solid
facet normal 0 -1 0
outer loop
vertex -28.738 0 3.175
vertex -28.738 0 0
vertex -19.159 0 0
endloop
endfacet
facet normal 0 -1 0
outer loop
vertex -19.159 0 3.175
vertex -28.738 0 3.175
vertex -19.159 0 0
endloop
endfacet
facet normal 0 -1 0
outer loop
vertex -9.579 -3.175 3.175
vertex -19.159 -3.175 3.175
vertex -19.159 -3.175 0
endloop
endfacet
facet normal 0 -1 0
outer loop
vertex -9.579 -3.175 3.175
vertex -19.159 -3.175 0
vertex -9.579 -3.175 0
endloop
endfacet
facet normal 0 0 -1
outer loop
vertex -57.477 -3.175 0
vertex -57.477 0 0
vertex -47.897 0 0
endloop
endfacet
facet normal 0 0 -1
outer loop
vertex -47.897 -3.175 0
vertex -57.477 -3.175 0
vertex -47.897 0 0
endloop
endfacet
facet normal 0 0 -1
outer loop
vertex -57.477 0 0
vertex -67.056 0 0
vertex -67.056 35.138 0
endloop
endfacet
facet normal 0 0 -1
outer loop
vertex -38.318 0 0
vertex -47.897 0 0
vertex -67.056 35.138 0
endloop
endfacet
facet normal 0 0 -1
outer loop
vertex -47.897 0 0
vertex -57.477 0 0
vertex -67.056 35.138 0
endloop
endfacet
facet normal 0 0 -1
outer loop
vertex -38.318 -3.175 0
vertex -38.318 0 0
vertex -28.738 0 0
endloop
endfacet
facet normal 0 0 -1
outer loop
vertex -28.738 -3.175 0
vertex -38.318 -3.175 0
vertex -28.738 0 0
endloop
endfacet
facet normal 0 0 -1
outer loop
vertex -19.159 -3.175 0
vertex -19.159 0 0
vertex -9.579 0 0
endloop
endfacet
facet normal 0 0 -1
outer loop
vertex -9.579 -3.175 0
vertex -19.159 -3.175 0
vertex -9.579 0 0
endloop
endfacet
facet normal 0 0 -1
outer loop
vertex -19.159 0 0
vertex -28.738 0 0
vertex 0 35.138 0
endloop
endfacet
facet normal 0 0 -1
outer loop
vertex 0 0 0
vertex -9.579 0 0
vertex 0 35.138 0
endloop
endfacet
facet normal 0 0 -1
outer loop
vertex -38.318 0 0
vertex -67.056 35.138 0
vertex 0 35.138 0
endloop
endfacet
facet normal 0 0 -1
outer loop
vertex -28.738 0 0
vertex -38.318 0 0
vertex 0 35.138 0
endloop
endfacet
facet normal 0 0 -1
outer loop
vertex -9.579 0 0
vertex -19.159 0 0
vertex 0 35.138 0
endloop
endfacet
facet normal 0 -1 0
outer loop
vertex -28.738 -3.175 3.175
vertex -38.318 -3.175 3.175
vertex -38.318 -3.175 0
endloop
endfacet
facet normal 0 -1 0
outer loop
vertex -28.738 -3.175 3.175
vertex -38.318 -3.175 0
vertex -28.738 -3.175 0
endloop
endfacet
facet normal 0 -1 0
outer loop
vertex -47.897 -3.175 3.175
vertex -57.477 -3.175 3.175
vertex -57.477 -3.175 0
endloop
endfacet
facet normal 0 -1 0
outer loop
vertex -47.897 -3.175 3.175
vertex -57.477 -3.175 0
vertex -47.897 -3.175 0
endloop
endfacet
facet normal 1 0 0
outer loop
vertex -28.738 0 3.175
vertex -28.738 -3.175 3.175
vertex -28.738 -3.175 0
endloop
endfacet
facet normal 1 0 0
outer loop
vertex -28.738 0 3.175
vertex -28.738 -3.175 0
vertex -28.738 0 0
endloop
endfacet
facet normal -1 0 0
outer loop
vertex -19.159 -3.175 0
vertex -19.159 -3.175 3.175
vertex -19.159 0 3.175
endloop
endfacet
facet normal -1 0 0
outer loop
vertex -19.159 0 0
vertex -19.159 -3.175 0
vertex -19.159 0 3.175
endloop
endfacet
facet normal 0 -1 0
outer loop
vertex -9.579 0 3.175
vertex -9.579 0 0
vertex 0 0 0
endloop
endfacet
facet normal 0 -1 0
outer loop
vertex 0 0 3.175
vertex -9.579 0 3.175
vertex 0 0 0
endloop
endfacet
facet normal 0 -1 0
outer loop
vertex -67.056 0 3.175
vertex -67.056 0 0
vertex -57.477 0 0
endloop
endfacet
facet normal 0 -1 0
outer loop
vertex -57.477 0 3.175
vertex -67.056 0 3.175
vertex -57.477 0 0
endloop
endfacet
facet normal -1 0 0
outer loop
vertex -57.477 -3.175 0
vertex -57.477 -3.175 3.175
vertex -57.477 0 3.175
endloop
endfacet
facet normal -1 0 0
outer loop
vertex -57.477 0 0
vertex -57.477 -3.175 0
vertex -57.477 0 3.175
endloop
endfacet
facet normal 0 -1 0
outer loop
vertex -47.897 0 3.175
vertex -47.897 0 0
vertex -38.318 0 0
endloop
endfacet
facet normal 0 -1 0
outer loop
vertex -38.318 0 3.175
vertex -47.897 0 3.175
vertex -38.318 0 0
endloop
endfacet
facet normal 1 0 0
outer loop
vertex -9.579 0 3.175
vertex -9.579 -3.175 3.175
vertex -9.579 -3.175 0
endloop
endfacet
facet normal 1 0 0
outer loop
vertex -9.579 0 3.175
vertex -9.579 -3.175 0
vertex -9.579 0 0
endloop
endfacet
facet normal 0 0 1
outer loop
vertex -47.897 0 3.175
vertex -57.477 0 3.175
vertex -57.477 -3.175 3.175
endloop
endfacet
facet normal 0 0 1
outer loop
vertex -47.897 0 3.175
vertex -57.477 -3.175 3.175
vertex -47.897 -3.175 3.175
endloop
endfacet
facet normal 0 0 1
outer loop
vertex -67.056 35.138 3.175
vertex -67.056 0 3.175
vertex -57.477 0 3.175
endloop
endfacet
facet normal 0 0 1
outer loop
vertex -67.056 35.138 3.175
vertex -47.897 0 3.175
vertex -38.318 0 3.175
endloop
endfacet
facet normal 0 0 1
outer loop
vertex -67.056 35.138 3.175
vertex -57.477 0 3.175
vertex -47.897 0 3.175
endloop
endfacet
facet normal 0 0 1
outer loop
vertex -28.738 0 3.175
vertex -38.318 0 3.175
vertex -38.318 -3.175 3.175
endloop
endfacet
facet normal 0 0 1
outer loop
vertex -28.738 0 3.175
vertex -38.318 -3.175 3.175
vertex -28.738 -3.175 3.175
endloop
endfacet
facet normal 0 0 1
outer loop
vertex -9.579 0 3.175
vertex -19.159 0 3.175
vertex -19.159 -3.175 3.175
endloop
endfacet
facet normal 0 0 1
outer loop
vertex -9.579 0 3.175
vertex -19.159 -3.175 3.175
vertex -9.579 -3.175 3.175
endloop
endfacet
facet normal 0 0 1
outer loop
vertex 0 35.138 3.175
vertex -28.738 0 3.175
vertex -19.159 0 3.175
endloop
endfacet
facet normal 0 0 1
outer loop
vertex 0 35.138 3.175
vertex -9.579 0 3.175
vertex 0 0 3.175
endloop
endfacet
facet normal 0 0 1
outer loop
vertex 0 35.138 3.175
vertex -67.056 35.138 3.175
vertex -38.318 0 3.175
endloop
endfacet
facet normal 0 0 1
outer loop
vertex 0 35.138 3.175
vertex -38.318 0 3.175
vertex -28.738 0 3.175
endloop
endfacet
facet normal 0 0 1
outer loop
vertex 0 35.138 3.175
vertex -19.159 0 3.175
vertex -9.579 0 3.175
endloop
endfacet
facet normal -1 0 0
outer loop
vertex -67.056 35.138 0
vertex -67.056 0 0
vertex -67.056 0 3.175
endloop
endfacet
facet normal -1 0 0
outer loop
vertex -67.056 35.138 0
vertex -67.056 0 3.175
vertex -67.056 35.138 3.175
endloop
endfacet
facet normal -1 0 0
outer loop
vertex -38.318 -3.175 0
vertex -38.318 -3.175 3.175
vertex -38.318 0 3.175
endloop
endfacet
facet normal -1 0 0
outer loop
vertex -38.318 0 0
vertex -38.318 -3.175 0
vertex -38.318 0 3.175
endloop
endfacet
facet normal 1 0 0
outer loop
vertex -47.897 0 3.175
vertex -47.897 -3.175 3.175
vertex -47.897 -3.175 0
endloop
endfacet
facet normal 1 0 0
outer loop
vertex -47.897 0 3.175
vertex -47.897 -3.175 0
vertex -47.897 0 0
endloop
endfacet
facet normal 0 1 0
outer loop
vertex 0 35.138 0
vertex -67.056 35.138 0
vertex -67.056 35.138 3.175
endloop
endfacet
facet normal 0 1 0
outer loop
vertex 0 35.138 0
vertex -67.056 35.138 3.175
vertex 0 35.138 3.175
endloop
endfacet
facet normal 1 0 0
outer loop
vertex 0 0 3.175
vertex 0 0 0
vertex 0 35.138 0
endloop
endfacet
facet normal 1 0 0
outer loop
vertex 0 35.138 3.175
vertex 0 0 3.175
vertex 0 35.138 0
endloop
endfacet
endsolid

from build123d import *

# Parameters (mm, degrees)
SKETCH3_W           = 67.056
SKETCH3_H           = 35.13836
BOSS_EXTRUDE1_DEPTH = 3.175
SKETCH4_W           = 9.579428572
SKETCH4_H           = 3.175
BOSS_EXTRUDE3_DEPTH = 3.175
LPATTERN1_COUNT     = 3
LPATTERN1_PITCH     = 19.158857143


with BuildPart() as part:
    # Sketch3 → Boss-Extrude1 (new body)
    with BuildSketch(Plane.XY):
        with Locations((-33.528, 17.56918)):
            Rectangle(SKETCH3_W, SKETCH3_H)
    extrude(amount=BOSS_EXTRUDE1_DEPTH)

    # Sketch4 → Boss-Extrude3 (add)
    with BuildSketch(Plane.XY.offset(3.175)):
        with Locations((-52.686857143, -1.5875)):
            Rectangle(SKETCH4_W, SKETCH4_H)
    boss_extrude3 = extrude(amount=-BOSS_EXTRUDE3_DEPTH)

    # LPattern1: Boss-Extrude3 ×3
    with Locations(*[(i * LPATTERN1_PITCH, 0, 0) for i in range(1, LPATTERN1_COUNT)]):
        add(boss_extrude3)


solid = part.part
